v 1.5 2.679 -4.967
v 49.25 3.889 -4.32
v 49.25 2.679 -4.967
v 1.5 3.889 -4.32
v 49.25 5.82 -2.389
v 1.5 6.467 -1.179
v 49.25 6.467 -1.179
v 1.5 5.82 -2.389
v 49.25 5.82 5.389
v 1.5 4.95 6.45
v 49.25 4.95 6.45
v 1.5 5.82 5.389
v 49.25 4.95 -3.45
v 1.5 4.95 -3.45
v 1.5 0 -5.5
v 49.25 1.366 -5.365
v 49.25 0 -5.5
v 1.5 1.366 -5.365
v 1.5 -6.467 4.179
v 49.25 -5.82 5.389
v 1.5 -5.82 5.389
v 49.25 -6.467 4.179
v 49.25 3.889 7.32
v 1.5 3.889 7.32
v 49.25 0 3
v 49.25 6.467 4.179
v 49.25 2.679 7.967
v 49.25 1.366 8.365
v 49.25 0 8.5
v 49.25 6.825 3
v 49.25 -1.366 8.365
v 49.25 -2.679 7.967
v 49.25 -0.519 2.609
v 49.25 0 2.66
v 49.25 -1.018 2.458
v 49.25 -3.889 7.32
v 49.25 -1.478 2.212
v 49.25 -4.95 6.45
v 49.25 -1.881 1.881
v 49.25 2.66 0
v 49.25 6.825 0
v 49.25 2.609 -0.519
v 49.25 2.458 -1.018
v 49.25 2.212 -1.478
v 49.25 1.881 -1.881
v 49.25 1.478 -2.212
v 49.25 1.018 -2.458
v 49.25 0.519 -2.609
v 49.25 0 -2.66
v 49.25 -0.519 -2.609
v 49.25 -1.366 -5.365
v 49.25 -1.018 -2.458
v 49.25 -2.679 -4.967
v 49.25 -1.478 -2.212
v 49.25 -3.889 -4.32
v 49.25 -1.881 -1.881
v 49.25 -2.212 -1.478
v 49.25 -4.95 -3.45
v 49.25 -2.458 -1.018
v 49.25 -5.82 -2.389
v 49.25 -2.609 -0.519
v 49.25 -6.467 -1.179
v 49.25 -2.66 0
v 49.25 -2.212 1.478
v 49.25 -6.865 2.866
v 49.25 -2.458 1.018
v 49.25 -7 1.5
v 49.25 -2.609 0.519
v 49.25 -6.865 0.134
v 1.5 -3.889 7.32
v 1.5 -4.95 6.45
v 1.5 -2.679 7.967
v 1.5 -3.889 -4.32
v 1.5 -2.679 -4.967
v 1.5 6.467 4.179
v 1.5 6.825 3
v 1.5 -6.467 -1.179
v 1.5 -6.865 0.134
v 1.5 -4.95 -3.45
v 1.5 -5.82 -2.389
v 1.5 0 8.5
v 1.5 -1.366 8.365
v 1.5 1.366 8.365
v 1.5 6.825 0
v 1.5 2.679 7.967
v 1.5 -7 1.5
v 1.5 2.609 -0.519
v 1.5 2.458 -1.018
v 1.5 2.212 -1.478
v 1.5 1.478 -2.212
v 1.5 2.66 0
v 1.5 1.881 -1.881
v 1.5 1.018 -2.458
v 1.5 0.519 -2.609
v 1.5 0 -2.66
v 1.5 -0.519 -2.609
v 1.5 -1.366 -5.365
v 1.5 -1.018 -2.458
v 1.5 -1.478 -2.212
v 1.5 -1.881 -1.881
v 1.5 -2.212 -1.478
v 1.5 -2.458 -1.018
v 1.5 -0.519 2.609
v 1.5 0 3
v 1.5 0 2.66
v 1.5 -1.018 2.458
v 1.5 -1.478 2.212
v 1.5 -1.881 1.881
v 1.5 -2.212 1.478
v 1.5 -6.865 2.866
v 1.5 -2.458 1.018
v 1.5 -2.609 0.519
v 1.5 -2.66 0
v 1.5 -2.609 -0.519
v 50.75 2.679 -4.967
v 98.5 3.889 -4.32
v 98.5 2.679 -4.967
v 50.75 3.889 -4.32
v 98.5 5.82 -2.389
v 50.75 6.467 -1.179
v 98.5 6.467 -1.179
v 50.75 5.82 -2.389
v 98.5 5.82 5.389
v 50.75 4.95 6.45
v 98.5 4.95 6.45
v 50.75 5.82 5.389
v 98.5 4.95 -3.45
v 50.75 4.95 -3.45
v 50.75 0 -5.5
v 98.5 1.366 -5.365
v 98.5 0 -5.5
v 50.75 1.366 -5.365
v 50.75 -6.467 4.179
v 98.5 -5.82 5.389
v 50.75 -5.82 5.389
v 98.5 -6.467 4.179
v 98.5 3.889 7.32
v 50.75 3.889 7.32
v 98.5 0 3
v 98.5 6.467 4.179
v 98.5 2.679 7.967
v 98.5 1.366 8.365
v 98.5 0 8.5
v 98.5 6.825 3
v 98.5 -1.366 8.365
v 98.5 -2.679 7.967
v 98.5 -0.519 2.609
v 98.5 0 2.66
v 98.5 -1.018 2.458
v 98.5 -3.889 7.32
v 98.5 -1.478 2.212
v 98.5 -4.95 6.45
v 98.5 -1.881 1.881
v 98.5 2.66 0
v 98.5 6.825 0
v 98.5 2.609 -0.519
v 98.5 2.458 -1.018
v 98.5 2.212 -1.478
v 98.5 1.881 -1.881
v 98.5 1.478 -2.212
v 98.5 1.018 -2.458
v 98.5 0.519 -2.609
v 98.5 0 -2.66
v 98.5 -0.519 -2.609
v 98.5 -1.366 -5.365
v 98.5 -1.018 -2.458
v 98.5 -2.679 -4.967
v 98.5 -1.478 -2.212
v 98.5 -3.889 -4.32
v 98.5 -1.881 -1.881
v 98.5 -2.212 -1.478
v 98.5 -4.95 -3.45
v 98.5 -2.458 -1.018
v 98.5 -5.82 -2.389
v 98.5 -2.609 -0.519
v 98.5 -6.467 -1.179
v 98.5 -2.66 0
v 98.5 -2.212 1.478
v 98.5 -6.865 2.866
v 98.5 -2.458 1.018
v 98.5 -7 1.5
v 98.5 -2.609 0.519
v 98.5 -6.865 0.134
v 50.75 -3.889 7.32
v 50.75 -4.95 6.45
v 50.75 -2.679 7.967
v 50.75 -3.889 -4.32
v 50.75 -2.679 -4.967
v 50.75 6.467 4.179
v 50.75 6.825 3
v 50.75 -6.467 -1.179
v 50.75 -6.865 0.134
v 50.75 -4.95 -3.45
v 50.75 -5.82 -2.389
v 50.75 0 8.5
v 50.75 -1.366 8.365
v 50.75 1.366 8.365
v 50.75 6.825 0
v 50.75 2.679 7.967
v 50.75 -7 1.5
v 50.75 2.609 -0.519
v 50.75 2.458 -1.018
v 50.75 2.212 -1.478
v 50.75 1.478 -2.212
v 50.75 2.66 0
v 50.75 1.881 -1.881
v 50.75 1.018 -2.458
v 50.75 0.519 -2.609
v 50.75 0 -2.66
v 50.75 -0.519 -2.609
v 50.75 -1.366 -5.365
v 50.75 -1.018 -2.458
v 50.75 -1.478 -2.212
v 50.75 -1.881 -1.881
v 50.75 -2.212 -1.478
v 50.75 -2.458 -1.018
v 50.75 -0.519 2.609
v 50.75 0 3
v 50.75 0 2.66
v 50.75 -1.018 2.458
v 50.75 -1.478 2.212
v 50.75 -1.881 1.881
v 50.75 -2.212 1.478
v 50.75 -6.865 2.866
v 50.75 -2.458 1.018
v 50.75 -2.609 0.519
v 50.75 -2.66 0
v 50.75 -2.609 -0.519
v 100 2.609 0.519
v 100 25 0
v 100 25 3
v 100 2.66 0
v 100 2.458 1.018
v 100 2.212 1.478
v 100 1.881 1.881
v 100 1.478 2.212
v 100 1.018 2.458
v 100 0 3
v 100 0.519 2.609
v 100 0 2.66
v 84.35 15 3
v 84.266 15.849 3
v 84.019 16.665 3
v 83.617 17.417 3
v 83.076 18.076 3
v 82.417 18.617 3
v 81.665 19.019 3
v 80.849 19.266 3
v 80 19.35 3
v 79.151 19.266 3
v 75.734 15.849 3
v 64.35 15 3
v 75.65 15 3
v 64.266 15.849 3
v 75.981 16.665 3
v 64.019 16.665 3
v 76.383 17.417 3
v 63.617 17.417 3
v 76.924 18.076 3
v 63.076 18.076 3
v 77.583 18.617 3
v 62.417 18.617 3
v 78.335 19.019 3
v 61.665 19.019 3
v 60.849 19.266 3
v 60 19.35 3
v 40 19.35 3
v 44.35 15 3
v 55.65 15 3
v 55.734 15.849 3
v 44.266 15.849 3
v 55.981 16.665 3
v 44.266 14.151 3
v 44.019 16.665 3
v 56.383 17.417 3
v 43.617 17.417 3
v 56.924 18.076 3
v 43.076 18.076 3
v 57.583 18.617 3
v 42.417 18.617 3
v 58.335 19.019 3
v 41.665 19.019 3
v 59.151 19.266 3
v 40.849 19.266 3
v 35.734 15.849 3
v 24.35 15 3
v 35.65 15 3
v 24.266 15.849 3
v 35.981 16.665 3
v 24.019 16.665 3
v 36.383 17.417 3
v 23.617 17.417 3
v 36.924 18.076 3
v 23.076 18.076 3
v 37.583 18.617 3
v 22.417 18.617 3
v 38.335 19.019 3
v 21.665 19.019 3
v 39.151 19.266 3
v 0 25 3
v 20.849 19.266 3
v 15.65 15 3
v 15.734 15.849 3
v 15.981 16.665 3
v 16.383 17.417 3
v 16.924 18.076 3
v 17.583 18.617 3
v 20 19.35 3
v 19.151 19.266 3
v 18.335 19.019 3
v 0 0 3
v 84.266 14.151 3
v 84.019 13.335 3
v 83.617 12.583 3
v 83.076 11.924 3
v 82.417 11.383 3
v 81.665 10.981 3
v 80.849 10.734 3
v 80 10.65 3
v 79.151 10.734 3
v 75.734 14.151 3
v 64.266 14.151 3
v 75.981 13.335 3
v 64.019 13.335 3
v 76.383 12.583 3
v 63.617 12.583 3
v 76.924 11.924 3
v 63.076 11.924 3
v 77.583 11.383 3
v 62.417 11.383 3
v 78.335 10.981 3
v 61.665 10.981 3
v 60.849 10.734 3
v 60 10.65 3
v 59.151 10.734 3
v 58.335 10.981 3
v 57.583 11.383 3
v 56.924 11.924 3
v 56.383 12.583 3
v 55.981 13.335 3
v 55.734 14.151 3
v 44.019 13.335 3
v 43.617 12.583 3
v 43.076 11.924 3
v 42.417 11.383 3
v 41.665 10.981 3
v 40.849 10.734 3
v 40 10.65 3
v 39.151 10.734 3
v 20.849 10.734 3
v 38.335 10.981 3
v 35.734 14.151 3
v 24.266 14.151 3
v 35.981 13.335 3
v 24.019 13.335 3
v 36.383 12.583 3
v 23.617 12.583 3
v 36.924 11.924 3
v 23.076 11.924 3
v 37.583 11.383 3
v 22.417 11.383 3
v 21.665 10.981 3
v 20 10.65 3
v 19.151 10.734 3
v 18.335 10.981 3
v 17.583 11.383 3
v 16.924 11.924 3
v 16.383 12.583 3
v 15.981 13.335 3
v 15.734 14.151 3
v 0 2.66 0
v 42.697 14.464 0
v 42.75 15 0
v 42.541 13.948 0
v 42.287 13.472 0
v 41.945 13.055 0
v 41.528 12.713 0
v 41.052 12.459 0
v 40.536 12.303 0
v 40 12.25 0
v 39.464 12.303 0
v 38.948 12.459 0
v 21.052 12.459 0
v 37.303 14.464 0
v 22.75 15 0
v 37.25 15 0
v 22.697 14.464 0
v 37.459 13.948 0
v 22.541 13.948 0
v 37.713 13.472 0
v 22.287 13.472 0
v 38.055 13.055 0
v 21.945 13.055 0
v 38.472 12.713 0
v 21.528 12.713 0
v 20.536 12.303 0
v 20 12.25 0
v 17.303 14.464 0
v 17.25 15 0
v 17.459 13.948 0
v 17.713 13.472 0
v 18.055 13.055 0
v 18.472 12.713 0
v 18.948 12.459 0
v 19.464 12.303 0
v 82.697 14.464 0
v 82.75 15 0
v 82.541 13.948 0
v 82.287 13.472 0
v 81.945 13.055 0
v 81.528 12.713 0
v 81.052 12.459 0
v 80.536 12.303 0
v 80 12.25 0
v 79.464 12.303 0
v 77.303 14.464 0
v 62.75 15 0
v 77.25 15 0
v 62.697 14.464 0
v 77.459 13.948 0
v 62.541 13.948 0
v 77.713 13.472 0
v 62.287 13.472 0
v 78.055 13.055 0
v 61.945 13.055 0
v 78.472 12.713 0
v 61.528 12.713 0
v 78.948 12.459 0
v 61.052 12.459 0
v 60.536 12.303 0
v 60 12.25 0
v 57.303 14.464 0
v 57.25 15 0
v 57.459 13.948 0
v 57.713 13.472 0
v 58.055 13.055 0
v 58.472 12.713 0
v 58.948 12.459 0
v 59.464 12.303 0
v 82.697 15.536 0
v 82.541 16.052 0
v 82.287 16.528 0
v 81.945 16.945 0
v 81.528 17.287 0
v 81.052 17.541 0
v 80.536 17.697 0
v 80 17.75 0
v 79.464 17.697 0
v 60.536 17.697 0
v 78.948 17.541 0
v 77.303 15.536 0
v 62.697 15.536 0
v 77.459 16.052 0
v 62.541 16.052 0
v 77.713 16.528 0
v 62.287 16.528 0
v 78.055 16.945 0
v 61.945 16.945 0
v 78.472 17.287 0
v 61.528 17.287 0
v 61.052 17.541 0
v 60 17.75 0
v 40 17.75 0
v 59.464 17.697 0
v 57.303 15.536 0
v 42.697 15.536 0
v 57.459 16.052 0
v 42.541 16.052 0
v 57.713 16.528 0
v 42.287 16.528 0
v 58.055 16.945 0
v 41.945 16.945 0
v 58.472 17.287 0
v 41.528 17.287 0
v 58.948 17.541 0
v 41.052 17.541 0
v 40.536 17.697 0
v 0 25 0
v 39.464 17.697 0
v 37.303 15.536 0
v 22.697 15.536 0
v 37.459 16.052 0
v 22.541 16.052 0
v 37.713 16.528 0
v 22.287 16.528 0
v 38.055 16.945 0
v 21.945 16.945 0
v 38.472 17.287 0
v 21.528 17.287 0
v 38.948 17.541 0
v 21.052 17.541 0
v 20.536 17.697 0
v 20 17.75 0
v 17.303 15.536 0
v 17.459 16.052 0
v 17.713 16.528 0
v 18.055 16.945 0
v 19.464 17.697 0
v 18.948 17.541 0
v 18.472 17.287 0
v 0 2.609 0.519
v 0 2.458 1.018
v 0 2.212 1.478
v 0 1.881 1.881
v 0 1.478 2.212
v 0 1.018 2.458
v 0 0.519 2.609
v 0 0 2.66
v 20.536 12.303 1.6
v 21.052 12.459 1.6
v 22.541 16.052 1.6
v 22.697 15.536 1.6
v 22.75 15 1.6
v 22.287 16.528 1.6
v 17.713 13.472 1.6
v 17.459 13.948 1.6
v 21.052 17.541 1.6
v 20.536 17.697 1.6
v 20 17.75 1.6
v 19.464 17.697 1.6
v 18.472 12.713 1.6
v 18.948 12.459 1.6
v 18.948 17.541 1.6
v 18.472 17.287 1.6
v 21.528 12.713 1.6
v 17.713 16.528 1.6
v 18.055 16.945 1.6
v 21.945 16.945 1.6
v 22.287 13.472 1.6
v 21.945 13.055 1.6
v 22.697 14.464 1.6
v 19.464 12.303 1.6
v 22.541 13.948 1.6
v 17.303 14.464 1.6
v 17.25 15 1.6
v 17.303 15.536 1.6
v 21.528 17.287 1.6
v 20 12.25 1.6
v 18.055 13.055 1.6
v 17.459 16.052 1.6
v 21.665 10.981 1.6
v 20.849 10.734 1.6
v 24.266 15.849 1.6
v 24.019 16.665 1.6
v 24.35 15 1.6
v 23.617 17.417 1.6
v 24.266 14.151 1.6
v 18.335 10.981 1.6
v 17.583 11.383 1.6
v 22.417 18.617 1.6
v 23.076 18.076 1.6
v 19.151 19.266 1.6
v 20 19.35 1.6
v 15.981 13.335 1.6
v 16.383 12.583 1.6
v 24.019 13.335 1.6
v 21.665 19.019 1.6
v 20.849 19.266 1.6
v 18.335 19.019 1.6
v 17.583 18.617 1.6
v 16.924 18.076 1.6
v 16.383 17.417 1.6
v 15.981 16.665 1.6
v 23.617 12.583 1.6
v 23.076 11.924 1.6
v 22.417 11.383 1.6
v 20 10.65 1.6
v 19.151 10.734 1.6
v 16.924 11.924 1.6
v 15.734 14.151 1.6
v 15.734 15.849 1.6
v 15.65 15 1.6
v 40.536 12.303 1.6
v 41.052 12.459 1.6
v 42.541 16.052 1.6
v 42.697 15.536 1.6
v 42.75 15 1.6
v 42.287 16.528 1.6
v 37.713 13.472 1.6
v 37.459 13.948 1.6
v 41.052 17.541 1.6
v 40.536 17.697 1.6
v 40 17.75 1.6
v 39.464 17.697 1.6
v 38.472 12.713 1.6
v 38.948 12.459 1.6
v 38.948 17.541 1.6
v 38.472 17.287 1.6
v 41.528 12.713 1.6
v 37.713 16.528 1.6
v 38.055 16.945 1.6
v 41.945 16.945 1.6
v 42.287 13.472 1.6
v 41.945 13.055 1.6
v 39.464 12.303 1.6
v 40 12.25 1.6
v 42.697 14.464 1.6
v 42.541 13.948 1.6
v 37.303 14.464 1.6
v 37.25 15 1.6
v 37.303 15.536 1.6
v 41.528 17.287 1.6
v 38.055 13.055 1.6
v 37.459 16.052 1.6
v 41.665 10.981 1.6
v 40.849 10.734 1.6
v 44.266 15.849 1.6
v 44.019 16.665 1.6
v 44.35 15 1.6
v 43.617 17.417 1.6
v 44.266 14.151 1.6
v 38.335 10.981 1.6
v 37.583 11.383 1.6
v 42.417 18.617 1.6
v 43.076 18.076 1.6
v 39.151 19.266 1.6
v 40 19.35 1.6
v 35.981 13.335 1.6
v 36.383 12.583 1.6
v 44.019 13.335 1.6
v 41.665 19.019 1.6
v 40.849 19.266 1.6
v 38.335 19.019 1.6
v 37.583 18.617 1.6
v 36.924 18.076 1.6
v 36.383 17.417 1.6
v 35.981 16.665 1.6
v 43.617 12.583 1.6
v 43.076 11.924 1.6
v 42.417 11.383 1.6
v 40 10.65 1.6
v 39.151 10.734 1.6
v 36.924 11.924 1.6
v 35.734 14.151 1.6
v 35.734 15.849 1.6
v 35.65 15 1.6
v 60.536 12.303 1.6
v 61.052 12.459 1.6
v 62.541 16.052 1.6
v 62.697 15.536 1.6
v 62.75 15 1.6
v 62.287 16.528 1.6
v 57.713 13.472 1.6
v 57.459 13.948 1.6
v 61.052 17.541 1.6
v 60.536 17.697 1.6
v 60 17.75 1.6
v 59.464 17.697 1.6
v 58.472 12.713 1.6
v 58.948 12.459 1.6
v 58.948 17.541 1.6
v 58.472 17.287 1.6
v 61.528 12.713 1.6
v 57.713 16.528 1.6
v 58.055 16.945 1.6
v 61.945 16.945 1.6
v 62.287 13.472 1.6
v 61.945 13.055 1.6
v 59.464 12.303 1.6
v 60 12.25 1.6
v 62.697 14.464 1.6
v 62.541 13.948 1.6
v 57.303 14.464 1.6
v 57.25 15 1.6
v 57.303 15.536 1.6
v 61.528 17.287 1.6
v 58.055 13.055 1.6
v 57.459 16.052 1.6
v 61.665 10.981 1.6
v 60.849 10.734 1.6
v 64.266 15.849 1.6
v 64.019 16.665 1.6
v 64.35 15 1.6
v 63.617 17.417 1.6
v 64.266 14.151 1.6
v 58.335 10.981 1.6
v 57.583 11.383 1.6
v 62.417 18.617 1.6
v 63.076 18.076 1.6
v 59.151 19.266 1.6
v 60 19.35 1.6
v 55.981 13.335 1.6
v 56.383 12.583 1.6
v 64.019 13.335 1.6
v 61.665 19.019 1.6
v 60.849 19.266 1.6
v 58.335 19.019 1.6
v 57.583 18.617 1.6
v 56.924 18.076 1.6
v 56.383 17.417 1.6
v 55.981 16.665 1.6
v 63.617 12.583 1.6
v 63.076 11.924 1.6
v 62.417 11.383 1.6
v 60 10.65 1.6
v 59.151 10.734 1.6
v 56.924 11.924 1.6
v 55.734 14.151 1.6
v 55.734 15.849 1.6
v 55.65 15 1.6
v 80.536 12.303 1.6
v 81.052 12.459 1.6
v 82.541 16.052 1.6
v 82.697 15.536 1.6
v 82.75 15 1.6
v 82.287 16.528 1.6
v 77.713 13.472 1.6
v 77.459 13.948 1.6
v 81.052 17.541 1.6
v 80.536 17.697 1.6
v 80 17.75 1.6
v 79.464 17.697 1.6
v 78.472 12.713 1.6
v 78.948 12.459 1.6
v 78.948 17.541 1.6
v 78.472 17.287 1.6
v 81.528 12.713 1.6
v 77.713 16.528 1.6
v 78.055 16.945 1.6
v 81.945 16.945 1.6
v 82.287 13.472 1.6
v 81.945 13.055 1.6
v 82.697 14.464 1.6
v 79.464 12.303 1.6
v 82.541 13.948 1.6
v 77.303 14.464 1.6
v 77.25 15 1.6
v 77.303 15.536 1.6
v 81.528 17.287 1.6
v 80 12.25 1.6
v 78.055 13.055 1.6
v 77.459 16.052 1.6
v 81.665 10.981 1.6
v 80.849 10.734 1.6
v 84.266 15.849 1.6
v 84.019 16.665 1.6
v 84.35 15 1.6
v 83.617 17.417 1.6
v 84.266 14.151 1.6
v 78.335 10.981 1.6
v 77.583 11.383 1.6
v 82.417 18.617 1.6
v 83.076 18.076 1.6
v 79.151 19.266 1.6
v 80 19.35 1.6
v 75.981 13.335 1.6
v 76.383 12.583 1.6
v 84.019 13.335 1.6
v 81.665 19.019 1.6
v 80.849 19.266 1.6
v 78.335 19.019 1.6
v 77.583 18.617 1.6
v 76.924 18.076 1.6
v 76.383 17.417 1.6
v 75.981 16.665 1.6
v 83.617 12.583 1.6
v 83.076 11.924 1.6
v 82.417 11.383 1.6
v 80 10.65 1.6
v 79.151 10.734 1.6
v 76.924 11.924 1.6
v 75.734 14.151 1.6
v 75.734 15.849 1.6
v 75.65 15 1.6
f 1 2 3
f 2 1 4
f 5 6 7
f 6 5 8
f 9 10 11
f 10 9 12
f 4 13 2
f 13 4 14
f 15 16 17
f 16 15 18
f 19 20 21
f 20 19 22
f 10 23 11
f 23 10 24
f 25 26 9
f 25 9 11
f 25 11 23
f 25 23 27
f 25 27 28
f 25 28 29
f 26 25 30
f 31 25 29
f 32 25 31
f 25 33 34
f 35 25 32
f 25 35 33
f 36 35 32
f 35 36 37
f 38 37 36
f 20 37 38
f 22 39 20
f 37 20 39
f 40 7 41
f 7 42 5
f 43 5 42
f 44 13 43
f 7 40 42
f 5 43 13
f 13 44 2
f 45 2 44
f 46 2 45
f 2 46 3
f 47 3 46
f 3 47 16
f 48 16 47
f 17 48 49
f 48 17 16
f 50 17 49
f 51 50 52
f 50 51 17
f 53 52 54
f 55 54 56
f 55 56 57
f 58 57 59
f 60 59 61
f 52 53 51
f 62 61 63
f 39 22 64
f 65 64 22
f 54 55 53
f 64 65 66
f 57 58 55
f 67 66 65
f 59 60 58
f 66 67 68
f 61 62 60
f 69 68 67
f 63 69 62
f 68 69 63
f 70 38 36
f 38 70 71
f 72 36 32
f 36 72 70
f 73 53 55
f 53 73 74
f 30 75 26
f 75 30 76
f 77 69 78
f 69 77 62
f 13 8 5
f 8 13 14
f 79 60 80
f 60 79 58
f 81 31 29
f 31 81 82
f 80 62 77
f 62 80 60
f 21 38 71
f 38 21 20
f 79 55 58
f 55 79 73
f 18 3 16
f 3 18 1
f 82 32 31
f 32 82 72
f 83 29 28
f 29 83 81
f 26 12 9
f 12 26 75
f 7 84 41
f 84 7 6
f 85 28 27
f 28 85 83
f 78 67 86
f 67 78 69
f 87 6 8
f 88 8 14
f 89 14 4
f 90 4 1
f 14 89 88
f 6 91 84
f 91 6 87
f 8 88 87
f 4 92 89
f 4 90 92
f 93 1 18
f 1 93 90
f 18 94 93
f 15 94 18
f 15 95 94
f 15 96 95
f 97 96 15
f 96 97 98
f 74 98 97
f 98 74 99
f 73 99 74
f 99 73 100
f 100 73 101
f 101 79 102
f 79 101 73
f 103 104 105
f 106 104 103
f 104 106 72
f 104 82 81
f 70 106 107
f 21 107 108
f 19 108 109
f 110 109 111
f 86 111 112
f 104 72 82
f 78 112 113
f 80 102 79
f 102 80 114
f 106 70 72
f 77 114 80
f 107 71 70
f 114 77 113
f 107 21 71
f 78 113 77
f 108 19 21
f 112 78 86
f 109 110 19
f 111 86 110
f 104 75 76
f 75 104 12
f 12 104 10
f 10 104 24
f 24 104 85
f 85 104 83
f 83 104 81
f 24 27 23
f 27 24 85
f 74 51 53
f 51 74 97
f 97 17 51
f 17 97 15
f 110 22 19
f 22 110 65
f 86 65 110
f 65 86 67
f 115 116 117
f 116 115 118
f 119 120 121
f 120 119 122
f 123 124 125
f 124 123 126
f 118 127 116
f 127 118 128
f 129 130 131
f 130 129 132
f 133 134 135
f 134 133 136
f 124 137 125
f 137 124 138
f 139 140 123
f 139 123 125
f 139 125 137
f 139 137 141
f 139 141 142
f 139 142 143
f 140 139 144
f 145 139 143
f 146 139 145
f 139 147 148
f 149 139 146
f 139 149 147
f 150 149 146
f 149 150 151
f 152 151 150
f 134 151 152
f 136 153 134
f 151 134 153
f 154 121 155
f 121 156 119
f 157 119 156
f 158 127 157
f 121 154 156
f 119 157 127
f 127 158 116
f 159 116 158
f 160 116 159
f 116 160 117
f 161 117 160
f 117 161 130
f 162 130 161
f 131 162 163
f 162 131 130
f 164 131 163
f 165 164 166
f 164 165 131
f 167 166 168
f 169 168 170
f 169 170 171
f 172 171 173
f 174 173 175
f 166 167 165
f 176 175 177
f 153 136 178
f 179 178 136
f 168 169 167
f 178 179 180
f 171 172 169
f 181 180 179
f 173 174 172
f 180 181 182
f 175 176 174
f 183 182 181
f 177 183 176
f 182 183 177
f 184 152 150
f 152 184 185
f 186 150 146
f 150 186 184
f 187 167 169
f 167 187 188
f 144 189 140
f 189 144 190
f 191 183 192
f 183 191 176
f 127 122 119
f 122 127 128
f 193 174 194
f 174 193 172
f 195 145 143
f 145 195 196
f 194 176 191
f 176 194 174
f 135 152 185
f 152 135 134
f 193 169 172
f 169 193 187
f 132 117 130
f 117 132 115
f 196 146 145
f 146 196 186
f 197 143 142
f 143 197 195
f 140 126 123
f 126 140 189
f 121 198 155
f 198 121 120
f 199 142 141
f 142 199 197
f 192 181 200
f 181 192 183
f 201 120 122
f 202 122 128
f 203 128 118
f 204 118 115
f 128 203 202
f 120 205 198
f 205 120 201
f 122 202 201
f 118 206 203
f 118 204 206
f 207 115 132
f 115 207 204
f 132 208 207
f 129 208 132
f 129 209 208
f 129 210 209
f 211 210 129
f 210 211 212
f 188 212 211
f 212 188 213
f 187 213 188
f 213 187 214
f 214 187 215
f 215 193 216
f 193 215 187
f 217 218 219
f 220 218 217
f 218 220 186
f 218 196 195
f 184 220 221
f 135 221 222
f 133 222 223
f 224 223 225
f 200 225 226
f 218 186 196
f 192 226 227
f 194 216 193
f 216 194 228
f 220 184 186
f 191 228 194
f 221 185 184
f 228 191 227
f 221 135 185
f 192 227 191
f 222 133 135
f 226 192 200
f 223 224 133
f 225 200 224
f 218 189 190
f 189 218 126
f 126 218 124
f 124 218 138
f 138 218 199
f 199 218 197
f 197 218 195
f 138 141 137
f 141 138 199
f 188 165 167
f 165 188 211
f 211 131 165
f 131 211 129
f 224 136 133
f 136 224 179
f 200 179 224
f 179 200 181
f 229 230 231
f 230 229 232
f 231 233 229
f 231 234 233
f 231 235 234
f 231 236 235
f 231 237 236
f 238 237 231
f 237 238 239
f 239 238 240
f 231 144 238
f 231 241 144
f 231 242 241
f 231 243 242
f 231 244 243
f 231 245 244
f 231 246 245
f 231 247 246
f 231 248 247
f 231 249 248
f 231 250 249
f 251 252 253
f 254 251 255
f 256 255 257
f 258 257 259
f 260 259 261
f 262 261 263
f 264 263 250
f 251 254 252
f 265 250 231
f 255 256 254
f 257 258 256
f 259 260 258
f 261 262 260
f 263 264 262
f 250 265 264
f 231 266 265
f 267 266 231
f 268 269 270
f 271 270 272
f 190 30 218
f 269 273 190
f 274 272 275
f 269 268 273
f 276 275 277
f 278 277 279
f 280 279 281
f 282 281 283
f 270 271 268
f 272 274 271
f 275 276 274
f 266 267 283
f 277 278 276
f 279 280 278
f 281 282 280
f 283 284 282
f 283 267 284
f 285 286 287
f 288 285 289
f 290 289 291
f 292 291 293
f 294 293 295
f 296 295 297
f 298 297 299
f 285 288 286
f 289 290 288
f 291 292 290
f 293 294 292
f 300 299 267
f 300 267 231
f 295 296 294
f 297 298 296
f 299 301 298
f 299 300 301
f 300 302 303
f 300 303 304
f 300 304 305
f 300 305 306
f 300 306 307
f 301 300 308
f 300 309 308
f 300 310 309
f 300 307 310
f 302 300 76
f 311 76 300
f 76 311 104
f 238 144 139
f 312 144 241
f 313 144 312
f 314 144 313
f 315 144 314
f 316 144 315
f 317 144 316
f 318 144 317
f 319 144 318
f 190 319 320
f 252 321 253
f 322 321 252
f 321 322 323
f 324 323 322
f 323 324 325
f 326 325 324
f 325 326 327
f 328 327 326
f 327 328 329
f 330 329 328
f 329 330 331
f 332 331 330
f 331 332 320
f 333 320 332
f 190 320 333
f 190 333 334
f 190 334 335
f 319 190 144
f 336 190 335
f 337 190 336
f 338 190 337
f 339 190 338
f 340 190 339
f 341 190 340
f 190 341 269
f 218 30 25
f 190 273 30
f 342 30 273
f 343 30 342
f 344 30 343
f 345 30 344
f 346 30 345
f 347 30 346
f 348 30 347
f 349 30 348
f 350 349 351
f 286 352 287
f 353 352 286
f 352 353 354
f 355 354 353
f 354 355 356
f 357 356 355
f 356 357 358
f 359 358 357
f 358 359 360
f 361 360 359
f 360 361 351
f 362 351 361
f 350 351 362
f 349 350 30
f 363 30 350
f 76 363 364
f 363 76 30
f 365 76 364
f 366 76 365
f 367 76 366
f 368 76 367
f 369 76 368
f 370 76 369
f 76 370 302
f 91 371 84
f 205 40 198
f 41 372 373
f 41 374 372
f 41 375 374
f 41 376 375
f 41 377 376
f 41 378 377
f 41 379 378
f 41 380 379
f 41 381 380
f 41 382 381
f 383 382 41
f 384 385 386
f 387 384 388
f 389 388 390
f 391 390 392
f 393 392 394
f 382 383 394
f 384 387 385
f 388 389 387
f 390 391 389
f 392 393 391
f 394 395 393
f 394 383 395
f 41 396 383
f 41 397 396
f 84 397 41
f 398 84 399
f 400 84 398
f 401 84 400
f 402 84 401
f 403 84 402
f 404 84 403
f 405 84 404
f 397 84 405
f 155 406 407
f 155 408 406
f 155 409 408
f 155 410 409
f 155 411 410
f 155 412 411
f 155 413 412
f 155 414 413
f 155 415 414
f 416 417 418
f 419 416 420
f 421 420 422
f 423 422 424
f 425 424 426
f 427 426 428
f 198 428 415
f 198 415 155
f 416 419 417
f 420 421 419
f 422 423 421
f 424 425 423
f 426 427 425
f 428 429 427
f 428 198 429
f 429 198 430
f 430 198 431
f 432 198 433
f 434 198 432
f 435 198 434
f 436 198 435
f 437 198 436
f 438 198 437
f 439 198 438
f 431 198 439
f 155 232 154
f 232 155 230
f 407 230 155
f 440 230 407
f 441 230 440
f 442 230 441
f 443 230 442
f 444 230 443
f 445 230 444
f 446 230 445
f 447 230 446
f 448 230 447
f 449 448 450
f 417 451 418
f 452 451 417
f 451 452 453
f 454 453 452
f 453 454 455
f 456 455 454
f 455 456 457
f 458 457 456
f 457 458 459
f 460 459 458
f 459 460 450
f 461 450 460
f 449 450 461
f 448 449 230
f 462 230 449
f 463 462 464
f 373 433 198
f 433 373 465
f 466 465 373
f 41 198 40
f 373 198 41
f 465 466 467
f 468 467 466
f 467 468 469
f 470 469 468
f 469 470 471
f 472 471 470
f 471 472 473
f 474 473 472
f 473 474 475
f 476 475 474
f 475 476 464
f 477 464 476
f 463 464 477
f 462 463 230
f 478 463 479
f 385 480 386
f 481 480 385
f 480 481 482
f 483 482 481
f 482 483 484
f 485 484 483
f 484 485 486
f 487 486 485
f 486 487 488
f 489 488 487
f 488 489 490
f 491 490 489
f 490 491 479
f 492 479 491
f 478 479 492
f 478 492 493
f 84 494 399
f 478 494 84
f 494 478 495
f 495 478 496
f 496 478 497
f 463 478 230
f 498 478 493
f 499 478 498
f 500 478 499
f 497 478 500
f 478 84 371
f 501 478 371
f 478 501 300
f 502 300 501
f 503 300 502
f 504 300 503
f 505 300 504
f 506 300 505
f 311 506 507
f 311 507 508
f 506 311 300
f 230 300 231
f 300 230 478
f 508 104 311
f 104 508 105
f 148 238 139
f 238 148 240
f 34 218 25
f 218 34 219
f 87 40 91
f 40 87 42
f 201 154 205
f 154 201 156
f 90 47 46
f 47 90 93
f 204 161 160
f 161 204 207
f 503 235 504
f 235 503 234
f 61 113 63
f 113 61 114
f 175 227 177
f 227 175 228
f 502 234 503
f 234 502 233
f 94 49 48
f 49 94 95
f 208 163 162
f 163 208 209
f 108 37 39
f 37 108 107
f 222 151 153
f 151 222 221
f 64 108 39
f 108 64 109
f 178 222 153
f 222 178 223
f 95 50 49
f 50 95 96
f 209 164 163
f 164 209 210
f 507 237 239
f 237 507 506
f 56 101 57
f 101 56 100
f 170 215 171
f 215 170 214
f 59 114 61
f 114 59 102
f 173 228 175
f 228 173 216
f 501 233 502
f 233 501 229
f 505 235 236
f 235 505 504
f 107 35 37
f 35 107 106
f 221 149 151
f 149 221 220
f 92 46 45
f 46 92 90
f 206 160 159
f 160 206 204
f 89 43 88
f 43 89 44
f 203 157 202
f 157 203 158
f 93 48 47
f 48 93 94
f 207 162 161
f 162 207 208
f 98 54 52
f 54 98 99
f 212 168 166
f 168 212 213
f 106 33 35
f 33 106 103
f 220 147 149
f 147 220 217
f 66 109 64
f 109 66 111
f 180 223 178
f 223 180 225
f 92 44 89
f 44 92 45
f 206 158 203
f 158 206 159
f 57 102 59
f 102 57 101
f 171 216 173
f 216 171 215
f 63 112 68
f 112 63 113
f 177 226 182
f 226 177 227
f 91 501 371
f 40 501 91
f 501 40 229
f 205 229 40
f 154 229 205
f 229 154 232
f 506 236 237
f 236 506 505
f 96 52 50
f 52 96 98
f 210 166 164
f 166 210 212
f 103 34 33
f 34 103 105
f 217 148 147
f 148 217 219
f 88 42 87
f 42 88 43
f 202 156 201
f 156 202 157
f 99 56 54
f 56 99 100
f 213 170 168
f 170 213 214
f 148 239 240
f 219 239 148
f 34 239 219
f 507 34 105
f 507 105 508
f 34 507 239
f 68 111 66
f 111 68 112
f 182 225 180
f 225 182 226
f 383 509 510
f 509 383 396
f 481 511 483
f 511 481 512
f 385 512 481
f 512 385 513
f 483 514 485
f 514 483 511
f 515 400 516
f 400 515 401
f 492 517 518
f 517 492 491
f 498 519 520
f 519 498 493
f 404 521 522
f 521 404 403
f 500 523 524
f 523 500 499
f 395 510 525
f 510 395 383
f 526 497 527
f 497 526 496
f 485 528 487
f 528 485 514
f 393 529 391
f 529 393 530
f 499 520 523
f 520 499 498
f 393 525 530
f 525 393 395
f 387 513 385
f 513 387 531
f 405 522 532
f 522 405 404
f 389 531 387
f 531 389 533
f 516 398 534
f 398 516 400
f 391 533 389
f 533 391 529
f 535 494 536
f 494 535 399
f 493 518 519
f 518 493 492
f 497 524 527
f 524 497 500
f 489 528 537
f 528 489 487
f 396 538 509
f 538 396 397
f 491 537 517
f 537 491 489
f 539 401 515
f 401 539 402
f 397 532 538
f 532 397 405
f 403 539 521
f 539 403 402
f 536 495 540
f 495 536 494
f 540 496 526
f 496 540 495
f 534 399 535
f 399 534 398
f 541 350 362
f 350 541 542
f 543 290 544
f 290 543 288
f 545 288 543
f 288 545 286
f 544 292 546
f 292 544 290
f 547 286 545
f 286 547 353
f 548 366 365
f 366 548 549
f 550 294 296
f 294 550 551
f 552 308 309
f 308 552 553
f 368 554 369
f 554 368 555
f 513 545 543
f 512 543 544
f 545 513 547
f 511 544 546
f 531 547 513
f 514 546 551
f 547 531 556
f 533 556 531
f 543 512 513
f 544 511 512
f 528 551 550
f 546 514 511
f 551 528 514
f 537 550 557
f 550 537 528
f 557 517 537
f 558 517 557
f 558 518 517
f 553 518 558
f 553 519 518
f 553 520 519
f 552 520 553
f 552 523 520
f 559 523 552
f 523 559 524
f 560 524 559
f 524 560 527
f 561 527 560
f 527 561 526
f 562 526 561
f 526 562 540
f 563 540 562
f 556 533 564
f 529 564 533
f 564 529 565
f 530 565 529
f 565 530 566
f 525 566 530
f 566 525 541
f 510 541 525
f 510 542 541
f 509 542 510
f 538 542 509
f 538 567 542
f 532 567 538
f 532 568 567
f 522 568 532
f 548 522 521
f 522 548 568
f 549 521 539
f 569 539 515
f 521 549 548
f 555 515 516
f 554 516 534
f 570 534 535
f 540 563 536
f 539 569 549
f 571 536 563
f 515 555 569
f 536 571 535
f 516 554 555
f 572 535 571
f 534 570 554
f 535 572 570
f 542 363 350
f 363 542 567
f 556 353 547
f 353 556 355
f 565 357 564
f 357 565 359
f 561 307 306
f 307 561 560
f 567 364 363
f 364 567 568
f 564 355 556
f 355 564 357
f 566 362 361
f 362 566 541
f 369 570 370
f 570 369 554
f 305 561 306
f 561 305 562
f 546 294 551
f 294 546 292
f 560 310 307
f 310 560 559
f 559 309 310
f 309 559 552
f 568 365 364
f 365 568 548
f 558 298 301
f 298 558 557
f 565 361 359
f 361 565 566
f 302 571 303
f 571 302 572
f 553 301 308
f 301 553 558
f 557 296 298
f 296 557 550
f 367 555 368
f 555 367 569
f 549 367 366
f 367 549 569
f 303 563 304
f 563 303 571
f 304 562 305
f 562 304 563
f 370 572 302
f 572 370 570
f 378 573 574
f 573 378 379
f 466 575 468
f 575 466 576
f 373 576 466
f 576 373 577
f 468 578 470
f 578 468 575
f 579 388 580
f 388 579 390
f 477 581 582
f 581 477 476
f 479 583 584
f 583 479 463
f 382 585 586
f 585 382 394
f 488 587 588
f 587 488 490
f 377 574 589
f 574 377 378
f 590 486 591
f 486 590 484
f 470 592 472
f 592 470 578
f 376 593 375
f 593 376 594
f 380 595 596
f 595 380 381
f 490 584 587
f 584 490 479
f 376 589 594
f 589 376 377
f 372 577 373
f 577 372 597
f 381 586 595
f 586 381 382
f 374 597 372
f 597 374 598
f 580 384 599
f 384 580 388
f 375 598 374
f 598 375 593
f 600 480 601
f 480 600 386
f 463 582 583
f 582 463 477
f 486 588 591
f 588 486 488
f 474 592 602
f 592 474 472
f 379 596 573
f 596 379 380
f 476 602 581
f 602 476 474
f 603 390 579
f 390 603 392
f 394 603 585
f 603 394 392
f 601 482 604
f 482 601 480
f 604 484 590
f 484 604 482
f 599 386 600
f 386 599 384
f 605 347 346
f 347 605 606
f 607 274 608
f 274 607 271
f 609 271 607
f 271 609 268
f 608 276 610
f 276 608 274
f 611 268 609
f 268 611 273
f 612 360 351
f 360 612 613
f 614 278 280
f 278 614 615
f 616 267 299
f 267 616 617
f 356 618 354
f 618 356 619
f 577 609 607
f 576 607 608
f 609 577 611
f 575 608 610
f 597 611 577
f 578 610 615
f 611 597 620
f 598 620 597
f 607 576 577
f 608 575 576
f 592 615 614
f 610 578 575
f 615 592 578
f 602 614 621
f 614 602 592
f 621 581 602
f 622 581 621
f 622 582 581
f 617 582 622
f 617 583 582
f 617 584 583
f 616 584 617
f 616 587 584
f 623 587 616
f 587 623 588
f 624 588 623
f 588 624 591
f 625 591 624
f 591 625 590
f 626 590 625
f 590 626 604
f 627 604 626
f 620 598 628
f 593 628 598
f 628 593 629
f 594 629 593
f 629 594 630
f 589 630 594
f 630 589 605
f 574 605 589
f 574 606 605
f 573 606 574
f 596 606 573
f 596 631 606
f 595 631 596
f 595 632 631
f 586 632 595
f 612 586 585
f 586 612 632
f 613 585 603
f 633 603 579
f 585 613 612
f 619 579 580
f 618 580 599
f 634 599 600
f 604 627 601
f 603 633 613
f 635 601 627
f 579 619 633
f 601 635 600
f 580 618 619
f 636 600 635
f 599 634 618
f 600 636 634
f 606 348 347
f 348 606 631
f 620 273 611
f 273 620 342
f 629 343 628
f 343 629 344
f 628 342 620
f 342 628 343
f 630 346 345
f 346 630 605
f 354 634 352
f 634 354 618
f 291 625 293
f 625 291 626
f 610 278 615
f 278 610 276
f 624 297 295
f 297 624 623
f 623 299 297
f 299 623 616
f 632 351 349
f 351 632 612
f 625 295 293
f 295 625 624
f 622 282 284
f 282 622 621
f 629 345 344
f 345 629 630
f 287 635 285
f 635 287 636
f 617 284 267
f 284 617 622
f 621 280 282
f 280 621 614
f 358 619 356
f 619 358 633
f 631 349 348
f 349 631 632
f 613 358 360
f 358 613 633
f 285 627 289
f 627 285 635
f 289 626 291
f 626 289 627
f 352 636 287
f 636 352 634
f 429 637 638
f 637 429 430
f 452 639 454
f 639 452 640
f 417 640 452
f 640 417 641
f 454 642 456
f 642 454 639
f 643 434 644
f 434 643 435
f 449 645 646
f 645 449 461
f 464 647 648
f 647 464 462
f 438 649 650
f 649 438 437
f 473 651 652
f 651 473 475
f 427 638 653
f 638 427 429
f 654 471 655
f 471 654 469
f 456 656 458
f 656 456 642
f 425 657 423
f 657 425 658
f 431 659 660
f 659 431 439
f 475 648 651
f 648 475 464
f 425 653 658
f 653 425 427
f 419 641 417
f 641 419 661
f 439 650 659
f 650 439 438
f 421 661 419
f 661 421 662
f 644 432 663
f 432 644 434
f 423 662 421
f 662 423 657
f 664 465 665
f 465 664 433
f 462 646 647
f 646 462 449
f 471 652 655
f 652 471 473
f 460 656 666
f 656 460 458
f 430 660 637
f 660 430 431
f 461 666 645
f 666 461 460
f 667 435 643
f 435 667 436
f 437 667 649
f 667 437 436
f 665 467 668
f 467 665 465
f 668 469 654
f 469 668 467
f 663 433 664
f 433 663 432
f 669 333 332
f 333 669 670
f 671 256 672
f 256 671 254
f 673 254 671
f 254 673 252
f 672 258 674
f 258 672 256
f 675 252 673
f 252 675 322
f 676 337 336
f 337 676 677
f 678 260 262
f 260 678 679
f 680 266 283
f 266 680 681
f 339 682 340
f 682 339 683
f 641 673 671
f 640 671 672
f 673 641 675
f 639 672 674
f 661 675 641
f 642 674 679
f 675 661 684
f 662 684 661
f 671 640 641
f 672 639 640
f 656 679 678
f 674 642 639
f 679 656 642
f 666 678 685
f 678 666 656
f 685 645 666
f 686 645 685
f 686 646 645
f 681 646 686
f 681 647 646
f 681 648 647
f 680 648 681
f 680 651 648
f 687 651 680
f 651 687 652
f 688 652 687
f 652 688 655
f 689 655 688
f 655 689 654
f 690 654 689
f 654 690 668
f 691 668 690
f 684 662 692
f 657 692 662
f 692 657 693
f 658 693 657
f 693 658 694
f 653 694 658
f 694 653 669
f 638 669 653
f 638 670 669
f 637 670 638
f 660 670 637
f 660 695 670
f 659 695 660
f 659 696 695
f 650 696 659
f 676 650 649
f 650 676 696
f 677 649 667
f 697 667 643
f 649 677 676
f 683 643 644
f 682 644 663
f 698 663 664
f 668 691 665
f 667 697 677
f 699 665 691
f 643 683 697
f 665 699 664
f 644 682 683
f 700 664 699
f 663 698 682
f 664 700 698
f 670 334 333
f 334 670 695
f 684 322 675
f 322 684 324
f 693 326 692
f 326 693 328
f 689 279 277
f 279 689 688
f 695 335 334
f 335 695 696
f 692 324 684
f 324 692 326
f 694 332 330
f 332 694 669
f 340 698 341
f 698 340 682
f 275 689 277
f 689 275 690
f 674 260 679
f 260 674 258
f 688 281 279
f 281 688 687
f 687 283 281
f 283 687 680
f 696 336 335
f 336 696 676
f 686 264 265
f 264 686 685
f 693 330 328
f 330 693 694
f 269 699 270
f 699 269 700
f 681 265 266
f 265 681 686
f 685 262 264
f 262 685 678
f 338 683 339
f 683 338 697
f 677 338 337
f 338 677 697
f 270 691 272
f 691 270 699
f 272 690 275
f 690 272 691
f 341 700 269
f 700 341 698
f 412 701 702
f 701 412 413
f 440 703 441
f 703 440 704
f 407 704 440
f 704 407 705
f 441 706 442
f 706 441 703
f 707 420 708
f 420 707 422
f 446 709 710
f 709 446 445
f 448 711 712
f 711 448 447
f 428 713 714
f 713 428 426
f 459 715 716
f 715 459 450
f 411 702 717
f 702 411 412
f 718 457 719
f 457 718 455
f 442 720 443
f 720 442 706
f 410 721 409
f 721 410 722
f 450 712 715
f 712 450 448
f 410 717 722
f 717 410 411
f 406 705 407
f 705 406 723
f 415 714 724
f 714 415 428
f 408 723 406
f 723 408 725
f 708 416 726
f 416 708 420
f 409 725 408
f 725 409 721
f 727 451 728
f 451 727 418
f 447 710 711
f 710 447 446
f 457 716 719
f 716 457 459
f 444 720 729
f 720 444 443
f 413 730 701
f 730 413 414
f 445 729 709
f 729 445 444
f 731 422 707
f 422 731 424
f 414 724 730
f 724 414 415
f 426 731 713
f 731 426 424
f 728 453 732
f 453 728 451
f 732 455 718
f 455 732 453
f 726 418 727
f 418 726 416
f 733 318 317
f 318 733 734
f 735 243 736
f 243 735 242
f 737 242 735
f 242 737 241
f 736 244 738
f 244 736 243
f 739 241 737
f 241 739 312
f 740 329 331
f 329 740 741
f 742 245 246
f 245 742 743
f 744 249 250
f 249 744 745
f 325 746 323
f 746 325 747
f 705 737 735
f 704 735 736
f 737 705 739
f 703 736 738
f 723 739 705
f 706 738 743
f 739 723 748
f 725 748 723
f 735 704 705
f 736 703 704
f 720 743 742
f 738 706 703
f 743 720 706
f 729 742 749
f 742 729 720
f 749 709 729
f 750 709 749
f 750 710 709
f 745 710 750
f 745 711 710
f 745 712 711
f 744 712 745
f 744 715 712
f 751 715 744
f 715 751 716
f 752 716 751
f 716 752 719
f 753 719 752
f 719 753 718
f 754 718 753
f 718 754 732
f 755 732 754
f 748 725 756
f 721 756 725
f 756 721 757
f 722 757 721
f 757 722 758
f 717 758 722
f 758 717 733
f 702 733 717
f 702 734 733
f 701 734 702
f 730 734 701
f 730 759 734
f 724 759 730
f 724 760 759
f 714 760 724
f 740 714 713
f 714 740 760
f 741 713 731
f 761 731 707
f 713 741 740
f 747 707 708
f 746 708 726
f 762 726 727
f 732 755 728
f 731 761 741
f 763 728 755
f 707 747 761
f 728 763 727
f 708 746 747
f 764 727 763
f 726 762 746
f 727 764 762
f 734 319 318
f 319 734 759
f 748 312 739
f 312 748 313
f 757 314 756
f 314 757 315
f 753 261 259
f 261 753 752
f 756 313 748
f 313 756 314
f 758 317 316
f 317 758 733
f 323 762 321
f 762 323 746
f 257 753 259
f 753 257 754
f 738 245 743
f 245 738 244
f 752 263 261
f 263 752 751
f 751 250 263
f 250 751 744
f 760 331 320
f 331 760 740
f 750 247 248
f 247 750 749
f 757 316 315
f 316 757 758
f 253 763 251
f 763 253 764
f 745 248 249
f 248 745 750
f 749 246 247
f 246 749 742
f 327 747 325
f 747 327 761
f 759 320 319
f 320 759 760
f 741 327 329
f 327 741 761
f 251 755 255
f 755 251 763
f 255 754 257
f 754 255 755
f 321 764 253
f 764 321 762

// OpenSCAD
$fn = 32;

// ----------------------------------------------------------------------
// Hinge leaf: 100 x 32 x 14 mm
// ----------------------------------------------------------------------

// --- parameters (mm) ---
plate_len = 100;          // leaf length, X
plate_w = 25;             // leaf width, Y
plate_t = 3;              // leaf thickness
barrel_d = 14;            // knuckle diameter
barrel_w = 47.75;         // knuckle width
knuckle_n = 2;            // number of knuckles
pin_d = 5.32;             // pin bore
gap = 1.5;                // gap between the knuckles
screw_d = 5.5;            // screw clearance
cs_d = 8.7;               // countersink diameter
cs_h = 1.4;               // countersink depth

module leaf() {
  cube([plate_len, plate_w, plate_t]);
}

module knuckles() {
  /* barrels sit on the leaf edge, the pin axis at half the leaf thickness */
  for (i = [0 : knuckle_n - 1])
    translate([gap + i * (barrel_w + gap), 0, plate_t * 0.5])
      rotate([0, 90, 0]) cylinder(h = barrel_w, d = barrel_d);
}

difference() {
  union() {
    leaf();
    knuckles();
  }
  rotate([0, 90, 0]) translate([0, 0, -1])
    cylinder(h = plate_len + 2, d = pin_d);
  translate([20, plate_w * 0.6, -1]) cylinder(h = plate_t + 2, d = screw_d);
  translate([20, plate_w * 0.6, plate_t - cs_h]) cylinder(h = cs_h + 0.5, d = cs_d);
  translate([40, plate_w * 0.6, -1]) cylinder(h = plate_t + 2, d = screw_d);
  translate([40, plate_w * 0.6, plate_t - cs_h]) cylinder(h = cs_h + 0.5, d = cs_d);
  translate([60, plate_w * 0.6, -1]) cylinder(h = plate_t + 2, d = screw_d);
  translate([60, plate_w * 0.6, plate_t - cs_h]) cylinder(h = cs_h + 0.5, d = cs_d);
  translate([80, plate_w * 0.6, -1]) cylinder(h = plate_t + 2, d = screw_d);
  translate([80, plate_w * 0.6, plate_t - cs_h]) cylinder(h = cs_h + 0.5, d = cs_d);
}
